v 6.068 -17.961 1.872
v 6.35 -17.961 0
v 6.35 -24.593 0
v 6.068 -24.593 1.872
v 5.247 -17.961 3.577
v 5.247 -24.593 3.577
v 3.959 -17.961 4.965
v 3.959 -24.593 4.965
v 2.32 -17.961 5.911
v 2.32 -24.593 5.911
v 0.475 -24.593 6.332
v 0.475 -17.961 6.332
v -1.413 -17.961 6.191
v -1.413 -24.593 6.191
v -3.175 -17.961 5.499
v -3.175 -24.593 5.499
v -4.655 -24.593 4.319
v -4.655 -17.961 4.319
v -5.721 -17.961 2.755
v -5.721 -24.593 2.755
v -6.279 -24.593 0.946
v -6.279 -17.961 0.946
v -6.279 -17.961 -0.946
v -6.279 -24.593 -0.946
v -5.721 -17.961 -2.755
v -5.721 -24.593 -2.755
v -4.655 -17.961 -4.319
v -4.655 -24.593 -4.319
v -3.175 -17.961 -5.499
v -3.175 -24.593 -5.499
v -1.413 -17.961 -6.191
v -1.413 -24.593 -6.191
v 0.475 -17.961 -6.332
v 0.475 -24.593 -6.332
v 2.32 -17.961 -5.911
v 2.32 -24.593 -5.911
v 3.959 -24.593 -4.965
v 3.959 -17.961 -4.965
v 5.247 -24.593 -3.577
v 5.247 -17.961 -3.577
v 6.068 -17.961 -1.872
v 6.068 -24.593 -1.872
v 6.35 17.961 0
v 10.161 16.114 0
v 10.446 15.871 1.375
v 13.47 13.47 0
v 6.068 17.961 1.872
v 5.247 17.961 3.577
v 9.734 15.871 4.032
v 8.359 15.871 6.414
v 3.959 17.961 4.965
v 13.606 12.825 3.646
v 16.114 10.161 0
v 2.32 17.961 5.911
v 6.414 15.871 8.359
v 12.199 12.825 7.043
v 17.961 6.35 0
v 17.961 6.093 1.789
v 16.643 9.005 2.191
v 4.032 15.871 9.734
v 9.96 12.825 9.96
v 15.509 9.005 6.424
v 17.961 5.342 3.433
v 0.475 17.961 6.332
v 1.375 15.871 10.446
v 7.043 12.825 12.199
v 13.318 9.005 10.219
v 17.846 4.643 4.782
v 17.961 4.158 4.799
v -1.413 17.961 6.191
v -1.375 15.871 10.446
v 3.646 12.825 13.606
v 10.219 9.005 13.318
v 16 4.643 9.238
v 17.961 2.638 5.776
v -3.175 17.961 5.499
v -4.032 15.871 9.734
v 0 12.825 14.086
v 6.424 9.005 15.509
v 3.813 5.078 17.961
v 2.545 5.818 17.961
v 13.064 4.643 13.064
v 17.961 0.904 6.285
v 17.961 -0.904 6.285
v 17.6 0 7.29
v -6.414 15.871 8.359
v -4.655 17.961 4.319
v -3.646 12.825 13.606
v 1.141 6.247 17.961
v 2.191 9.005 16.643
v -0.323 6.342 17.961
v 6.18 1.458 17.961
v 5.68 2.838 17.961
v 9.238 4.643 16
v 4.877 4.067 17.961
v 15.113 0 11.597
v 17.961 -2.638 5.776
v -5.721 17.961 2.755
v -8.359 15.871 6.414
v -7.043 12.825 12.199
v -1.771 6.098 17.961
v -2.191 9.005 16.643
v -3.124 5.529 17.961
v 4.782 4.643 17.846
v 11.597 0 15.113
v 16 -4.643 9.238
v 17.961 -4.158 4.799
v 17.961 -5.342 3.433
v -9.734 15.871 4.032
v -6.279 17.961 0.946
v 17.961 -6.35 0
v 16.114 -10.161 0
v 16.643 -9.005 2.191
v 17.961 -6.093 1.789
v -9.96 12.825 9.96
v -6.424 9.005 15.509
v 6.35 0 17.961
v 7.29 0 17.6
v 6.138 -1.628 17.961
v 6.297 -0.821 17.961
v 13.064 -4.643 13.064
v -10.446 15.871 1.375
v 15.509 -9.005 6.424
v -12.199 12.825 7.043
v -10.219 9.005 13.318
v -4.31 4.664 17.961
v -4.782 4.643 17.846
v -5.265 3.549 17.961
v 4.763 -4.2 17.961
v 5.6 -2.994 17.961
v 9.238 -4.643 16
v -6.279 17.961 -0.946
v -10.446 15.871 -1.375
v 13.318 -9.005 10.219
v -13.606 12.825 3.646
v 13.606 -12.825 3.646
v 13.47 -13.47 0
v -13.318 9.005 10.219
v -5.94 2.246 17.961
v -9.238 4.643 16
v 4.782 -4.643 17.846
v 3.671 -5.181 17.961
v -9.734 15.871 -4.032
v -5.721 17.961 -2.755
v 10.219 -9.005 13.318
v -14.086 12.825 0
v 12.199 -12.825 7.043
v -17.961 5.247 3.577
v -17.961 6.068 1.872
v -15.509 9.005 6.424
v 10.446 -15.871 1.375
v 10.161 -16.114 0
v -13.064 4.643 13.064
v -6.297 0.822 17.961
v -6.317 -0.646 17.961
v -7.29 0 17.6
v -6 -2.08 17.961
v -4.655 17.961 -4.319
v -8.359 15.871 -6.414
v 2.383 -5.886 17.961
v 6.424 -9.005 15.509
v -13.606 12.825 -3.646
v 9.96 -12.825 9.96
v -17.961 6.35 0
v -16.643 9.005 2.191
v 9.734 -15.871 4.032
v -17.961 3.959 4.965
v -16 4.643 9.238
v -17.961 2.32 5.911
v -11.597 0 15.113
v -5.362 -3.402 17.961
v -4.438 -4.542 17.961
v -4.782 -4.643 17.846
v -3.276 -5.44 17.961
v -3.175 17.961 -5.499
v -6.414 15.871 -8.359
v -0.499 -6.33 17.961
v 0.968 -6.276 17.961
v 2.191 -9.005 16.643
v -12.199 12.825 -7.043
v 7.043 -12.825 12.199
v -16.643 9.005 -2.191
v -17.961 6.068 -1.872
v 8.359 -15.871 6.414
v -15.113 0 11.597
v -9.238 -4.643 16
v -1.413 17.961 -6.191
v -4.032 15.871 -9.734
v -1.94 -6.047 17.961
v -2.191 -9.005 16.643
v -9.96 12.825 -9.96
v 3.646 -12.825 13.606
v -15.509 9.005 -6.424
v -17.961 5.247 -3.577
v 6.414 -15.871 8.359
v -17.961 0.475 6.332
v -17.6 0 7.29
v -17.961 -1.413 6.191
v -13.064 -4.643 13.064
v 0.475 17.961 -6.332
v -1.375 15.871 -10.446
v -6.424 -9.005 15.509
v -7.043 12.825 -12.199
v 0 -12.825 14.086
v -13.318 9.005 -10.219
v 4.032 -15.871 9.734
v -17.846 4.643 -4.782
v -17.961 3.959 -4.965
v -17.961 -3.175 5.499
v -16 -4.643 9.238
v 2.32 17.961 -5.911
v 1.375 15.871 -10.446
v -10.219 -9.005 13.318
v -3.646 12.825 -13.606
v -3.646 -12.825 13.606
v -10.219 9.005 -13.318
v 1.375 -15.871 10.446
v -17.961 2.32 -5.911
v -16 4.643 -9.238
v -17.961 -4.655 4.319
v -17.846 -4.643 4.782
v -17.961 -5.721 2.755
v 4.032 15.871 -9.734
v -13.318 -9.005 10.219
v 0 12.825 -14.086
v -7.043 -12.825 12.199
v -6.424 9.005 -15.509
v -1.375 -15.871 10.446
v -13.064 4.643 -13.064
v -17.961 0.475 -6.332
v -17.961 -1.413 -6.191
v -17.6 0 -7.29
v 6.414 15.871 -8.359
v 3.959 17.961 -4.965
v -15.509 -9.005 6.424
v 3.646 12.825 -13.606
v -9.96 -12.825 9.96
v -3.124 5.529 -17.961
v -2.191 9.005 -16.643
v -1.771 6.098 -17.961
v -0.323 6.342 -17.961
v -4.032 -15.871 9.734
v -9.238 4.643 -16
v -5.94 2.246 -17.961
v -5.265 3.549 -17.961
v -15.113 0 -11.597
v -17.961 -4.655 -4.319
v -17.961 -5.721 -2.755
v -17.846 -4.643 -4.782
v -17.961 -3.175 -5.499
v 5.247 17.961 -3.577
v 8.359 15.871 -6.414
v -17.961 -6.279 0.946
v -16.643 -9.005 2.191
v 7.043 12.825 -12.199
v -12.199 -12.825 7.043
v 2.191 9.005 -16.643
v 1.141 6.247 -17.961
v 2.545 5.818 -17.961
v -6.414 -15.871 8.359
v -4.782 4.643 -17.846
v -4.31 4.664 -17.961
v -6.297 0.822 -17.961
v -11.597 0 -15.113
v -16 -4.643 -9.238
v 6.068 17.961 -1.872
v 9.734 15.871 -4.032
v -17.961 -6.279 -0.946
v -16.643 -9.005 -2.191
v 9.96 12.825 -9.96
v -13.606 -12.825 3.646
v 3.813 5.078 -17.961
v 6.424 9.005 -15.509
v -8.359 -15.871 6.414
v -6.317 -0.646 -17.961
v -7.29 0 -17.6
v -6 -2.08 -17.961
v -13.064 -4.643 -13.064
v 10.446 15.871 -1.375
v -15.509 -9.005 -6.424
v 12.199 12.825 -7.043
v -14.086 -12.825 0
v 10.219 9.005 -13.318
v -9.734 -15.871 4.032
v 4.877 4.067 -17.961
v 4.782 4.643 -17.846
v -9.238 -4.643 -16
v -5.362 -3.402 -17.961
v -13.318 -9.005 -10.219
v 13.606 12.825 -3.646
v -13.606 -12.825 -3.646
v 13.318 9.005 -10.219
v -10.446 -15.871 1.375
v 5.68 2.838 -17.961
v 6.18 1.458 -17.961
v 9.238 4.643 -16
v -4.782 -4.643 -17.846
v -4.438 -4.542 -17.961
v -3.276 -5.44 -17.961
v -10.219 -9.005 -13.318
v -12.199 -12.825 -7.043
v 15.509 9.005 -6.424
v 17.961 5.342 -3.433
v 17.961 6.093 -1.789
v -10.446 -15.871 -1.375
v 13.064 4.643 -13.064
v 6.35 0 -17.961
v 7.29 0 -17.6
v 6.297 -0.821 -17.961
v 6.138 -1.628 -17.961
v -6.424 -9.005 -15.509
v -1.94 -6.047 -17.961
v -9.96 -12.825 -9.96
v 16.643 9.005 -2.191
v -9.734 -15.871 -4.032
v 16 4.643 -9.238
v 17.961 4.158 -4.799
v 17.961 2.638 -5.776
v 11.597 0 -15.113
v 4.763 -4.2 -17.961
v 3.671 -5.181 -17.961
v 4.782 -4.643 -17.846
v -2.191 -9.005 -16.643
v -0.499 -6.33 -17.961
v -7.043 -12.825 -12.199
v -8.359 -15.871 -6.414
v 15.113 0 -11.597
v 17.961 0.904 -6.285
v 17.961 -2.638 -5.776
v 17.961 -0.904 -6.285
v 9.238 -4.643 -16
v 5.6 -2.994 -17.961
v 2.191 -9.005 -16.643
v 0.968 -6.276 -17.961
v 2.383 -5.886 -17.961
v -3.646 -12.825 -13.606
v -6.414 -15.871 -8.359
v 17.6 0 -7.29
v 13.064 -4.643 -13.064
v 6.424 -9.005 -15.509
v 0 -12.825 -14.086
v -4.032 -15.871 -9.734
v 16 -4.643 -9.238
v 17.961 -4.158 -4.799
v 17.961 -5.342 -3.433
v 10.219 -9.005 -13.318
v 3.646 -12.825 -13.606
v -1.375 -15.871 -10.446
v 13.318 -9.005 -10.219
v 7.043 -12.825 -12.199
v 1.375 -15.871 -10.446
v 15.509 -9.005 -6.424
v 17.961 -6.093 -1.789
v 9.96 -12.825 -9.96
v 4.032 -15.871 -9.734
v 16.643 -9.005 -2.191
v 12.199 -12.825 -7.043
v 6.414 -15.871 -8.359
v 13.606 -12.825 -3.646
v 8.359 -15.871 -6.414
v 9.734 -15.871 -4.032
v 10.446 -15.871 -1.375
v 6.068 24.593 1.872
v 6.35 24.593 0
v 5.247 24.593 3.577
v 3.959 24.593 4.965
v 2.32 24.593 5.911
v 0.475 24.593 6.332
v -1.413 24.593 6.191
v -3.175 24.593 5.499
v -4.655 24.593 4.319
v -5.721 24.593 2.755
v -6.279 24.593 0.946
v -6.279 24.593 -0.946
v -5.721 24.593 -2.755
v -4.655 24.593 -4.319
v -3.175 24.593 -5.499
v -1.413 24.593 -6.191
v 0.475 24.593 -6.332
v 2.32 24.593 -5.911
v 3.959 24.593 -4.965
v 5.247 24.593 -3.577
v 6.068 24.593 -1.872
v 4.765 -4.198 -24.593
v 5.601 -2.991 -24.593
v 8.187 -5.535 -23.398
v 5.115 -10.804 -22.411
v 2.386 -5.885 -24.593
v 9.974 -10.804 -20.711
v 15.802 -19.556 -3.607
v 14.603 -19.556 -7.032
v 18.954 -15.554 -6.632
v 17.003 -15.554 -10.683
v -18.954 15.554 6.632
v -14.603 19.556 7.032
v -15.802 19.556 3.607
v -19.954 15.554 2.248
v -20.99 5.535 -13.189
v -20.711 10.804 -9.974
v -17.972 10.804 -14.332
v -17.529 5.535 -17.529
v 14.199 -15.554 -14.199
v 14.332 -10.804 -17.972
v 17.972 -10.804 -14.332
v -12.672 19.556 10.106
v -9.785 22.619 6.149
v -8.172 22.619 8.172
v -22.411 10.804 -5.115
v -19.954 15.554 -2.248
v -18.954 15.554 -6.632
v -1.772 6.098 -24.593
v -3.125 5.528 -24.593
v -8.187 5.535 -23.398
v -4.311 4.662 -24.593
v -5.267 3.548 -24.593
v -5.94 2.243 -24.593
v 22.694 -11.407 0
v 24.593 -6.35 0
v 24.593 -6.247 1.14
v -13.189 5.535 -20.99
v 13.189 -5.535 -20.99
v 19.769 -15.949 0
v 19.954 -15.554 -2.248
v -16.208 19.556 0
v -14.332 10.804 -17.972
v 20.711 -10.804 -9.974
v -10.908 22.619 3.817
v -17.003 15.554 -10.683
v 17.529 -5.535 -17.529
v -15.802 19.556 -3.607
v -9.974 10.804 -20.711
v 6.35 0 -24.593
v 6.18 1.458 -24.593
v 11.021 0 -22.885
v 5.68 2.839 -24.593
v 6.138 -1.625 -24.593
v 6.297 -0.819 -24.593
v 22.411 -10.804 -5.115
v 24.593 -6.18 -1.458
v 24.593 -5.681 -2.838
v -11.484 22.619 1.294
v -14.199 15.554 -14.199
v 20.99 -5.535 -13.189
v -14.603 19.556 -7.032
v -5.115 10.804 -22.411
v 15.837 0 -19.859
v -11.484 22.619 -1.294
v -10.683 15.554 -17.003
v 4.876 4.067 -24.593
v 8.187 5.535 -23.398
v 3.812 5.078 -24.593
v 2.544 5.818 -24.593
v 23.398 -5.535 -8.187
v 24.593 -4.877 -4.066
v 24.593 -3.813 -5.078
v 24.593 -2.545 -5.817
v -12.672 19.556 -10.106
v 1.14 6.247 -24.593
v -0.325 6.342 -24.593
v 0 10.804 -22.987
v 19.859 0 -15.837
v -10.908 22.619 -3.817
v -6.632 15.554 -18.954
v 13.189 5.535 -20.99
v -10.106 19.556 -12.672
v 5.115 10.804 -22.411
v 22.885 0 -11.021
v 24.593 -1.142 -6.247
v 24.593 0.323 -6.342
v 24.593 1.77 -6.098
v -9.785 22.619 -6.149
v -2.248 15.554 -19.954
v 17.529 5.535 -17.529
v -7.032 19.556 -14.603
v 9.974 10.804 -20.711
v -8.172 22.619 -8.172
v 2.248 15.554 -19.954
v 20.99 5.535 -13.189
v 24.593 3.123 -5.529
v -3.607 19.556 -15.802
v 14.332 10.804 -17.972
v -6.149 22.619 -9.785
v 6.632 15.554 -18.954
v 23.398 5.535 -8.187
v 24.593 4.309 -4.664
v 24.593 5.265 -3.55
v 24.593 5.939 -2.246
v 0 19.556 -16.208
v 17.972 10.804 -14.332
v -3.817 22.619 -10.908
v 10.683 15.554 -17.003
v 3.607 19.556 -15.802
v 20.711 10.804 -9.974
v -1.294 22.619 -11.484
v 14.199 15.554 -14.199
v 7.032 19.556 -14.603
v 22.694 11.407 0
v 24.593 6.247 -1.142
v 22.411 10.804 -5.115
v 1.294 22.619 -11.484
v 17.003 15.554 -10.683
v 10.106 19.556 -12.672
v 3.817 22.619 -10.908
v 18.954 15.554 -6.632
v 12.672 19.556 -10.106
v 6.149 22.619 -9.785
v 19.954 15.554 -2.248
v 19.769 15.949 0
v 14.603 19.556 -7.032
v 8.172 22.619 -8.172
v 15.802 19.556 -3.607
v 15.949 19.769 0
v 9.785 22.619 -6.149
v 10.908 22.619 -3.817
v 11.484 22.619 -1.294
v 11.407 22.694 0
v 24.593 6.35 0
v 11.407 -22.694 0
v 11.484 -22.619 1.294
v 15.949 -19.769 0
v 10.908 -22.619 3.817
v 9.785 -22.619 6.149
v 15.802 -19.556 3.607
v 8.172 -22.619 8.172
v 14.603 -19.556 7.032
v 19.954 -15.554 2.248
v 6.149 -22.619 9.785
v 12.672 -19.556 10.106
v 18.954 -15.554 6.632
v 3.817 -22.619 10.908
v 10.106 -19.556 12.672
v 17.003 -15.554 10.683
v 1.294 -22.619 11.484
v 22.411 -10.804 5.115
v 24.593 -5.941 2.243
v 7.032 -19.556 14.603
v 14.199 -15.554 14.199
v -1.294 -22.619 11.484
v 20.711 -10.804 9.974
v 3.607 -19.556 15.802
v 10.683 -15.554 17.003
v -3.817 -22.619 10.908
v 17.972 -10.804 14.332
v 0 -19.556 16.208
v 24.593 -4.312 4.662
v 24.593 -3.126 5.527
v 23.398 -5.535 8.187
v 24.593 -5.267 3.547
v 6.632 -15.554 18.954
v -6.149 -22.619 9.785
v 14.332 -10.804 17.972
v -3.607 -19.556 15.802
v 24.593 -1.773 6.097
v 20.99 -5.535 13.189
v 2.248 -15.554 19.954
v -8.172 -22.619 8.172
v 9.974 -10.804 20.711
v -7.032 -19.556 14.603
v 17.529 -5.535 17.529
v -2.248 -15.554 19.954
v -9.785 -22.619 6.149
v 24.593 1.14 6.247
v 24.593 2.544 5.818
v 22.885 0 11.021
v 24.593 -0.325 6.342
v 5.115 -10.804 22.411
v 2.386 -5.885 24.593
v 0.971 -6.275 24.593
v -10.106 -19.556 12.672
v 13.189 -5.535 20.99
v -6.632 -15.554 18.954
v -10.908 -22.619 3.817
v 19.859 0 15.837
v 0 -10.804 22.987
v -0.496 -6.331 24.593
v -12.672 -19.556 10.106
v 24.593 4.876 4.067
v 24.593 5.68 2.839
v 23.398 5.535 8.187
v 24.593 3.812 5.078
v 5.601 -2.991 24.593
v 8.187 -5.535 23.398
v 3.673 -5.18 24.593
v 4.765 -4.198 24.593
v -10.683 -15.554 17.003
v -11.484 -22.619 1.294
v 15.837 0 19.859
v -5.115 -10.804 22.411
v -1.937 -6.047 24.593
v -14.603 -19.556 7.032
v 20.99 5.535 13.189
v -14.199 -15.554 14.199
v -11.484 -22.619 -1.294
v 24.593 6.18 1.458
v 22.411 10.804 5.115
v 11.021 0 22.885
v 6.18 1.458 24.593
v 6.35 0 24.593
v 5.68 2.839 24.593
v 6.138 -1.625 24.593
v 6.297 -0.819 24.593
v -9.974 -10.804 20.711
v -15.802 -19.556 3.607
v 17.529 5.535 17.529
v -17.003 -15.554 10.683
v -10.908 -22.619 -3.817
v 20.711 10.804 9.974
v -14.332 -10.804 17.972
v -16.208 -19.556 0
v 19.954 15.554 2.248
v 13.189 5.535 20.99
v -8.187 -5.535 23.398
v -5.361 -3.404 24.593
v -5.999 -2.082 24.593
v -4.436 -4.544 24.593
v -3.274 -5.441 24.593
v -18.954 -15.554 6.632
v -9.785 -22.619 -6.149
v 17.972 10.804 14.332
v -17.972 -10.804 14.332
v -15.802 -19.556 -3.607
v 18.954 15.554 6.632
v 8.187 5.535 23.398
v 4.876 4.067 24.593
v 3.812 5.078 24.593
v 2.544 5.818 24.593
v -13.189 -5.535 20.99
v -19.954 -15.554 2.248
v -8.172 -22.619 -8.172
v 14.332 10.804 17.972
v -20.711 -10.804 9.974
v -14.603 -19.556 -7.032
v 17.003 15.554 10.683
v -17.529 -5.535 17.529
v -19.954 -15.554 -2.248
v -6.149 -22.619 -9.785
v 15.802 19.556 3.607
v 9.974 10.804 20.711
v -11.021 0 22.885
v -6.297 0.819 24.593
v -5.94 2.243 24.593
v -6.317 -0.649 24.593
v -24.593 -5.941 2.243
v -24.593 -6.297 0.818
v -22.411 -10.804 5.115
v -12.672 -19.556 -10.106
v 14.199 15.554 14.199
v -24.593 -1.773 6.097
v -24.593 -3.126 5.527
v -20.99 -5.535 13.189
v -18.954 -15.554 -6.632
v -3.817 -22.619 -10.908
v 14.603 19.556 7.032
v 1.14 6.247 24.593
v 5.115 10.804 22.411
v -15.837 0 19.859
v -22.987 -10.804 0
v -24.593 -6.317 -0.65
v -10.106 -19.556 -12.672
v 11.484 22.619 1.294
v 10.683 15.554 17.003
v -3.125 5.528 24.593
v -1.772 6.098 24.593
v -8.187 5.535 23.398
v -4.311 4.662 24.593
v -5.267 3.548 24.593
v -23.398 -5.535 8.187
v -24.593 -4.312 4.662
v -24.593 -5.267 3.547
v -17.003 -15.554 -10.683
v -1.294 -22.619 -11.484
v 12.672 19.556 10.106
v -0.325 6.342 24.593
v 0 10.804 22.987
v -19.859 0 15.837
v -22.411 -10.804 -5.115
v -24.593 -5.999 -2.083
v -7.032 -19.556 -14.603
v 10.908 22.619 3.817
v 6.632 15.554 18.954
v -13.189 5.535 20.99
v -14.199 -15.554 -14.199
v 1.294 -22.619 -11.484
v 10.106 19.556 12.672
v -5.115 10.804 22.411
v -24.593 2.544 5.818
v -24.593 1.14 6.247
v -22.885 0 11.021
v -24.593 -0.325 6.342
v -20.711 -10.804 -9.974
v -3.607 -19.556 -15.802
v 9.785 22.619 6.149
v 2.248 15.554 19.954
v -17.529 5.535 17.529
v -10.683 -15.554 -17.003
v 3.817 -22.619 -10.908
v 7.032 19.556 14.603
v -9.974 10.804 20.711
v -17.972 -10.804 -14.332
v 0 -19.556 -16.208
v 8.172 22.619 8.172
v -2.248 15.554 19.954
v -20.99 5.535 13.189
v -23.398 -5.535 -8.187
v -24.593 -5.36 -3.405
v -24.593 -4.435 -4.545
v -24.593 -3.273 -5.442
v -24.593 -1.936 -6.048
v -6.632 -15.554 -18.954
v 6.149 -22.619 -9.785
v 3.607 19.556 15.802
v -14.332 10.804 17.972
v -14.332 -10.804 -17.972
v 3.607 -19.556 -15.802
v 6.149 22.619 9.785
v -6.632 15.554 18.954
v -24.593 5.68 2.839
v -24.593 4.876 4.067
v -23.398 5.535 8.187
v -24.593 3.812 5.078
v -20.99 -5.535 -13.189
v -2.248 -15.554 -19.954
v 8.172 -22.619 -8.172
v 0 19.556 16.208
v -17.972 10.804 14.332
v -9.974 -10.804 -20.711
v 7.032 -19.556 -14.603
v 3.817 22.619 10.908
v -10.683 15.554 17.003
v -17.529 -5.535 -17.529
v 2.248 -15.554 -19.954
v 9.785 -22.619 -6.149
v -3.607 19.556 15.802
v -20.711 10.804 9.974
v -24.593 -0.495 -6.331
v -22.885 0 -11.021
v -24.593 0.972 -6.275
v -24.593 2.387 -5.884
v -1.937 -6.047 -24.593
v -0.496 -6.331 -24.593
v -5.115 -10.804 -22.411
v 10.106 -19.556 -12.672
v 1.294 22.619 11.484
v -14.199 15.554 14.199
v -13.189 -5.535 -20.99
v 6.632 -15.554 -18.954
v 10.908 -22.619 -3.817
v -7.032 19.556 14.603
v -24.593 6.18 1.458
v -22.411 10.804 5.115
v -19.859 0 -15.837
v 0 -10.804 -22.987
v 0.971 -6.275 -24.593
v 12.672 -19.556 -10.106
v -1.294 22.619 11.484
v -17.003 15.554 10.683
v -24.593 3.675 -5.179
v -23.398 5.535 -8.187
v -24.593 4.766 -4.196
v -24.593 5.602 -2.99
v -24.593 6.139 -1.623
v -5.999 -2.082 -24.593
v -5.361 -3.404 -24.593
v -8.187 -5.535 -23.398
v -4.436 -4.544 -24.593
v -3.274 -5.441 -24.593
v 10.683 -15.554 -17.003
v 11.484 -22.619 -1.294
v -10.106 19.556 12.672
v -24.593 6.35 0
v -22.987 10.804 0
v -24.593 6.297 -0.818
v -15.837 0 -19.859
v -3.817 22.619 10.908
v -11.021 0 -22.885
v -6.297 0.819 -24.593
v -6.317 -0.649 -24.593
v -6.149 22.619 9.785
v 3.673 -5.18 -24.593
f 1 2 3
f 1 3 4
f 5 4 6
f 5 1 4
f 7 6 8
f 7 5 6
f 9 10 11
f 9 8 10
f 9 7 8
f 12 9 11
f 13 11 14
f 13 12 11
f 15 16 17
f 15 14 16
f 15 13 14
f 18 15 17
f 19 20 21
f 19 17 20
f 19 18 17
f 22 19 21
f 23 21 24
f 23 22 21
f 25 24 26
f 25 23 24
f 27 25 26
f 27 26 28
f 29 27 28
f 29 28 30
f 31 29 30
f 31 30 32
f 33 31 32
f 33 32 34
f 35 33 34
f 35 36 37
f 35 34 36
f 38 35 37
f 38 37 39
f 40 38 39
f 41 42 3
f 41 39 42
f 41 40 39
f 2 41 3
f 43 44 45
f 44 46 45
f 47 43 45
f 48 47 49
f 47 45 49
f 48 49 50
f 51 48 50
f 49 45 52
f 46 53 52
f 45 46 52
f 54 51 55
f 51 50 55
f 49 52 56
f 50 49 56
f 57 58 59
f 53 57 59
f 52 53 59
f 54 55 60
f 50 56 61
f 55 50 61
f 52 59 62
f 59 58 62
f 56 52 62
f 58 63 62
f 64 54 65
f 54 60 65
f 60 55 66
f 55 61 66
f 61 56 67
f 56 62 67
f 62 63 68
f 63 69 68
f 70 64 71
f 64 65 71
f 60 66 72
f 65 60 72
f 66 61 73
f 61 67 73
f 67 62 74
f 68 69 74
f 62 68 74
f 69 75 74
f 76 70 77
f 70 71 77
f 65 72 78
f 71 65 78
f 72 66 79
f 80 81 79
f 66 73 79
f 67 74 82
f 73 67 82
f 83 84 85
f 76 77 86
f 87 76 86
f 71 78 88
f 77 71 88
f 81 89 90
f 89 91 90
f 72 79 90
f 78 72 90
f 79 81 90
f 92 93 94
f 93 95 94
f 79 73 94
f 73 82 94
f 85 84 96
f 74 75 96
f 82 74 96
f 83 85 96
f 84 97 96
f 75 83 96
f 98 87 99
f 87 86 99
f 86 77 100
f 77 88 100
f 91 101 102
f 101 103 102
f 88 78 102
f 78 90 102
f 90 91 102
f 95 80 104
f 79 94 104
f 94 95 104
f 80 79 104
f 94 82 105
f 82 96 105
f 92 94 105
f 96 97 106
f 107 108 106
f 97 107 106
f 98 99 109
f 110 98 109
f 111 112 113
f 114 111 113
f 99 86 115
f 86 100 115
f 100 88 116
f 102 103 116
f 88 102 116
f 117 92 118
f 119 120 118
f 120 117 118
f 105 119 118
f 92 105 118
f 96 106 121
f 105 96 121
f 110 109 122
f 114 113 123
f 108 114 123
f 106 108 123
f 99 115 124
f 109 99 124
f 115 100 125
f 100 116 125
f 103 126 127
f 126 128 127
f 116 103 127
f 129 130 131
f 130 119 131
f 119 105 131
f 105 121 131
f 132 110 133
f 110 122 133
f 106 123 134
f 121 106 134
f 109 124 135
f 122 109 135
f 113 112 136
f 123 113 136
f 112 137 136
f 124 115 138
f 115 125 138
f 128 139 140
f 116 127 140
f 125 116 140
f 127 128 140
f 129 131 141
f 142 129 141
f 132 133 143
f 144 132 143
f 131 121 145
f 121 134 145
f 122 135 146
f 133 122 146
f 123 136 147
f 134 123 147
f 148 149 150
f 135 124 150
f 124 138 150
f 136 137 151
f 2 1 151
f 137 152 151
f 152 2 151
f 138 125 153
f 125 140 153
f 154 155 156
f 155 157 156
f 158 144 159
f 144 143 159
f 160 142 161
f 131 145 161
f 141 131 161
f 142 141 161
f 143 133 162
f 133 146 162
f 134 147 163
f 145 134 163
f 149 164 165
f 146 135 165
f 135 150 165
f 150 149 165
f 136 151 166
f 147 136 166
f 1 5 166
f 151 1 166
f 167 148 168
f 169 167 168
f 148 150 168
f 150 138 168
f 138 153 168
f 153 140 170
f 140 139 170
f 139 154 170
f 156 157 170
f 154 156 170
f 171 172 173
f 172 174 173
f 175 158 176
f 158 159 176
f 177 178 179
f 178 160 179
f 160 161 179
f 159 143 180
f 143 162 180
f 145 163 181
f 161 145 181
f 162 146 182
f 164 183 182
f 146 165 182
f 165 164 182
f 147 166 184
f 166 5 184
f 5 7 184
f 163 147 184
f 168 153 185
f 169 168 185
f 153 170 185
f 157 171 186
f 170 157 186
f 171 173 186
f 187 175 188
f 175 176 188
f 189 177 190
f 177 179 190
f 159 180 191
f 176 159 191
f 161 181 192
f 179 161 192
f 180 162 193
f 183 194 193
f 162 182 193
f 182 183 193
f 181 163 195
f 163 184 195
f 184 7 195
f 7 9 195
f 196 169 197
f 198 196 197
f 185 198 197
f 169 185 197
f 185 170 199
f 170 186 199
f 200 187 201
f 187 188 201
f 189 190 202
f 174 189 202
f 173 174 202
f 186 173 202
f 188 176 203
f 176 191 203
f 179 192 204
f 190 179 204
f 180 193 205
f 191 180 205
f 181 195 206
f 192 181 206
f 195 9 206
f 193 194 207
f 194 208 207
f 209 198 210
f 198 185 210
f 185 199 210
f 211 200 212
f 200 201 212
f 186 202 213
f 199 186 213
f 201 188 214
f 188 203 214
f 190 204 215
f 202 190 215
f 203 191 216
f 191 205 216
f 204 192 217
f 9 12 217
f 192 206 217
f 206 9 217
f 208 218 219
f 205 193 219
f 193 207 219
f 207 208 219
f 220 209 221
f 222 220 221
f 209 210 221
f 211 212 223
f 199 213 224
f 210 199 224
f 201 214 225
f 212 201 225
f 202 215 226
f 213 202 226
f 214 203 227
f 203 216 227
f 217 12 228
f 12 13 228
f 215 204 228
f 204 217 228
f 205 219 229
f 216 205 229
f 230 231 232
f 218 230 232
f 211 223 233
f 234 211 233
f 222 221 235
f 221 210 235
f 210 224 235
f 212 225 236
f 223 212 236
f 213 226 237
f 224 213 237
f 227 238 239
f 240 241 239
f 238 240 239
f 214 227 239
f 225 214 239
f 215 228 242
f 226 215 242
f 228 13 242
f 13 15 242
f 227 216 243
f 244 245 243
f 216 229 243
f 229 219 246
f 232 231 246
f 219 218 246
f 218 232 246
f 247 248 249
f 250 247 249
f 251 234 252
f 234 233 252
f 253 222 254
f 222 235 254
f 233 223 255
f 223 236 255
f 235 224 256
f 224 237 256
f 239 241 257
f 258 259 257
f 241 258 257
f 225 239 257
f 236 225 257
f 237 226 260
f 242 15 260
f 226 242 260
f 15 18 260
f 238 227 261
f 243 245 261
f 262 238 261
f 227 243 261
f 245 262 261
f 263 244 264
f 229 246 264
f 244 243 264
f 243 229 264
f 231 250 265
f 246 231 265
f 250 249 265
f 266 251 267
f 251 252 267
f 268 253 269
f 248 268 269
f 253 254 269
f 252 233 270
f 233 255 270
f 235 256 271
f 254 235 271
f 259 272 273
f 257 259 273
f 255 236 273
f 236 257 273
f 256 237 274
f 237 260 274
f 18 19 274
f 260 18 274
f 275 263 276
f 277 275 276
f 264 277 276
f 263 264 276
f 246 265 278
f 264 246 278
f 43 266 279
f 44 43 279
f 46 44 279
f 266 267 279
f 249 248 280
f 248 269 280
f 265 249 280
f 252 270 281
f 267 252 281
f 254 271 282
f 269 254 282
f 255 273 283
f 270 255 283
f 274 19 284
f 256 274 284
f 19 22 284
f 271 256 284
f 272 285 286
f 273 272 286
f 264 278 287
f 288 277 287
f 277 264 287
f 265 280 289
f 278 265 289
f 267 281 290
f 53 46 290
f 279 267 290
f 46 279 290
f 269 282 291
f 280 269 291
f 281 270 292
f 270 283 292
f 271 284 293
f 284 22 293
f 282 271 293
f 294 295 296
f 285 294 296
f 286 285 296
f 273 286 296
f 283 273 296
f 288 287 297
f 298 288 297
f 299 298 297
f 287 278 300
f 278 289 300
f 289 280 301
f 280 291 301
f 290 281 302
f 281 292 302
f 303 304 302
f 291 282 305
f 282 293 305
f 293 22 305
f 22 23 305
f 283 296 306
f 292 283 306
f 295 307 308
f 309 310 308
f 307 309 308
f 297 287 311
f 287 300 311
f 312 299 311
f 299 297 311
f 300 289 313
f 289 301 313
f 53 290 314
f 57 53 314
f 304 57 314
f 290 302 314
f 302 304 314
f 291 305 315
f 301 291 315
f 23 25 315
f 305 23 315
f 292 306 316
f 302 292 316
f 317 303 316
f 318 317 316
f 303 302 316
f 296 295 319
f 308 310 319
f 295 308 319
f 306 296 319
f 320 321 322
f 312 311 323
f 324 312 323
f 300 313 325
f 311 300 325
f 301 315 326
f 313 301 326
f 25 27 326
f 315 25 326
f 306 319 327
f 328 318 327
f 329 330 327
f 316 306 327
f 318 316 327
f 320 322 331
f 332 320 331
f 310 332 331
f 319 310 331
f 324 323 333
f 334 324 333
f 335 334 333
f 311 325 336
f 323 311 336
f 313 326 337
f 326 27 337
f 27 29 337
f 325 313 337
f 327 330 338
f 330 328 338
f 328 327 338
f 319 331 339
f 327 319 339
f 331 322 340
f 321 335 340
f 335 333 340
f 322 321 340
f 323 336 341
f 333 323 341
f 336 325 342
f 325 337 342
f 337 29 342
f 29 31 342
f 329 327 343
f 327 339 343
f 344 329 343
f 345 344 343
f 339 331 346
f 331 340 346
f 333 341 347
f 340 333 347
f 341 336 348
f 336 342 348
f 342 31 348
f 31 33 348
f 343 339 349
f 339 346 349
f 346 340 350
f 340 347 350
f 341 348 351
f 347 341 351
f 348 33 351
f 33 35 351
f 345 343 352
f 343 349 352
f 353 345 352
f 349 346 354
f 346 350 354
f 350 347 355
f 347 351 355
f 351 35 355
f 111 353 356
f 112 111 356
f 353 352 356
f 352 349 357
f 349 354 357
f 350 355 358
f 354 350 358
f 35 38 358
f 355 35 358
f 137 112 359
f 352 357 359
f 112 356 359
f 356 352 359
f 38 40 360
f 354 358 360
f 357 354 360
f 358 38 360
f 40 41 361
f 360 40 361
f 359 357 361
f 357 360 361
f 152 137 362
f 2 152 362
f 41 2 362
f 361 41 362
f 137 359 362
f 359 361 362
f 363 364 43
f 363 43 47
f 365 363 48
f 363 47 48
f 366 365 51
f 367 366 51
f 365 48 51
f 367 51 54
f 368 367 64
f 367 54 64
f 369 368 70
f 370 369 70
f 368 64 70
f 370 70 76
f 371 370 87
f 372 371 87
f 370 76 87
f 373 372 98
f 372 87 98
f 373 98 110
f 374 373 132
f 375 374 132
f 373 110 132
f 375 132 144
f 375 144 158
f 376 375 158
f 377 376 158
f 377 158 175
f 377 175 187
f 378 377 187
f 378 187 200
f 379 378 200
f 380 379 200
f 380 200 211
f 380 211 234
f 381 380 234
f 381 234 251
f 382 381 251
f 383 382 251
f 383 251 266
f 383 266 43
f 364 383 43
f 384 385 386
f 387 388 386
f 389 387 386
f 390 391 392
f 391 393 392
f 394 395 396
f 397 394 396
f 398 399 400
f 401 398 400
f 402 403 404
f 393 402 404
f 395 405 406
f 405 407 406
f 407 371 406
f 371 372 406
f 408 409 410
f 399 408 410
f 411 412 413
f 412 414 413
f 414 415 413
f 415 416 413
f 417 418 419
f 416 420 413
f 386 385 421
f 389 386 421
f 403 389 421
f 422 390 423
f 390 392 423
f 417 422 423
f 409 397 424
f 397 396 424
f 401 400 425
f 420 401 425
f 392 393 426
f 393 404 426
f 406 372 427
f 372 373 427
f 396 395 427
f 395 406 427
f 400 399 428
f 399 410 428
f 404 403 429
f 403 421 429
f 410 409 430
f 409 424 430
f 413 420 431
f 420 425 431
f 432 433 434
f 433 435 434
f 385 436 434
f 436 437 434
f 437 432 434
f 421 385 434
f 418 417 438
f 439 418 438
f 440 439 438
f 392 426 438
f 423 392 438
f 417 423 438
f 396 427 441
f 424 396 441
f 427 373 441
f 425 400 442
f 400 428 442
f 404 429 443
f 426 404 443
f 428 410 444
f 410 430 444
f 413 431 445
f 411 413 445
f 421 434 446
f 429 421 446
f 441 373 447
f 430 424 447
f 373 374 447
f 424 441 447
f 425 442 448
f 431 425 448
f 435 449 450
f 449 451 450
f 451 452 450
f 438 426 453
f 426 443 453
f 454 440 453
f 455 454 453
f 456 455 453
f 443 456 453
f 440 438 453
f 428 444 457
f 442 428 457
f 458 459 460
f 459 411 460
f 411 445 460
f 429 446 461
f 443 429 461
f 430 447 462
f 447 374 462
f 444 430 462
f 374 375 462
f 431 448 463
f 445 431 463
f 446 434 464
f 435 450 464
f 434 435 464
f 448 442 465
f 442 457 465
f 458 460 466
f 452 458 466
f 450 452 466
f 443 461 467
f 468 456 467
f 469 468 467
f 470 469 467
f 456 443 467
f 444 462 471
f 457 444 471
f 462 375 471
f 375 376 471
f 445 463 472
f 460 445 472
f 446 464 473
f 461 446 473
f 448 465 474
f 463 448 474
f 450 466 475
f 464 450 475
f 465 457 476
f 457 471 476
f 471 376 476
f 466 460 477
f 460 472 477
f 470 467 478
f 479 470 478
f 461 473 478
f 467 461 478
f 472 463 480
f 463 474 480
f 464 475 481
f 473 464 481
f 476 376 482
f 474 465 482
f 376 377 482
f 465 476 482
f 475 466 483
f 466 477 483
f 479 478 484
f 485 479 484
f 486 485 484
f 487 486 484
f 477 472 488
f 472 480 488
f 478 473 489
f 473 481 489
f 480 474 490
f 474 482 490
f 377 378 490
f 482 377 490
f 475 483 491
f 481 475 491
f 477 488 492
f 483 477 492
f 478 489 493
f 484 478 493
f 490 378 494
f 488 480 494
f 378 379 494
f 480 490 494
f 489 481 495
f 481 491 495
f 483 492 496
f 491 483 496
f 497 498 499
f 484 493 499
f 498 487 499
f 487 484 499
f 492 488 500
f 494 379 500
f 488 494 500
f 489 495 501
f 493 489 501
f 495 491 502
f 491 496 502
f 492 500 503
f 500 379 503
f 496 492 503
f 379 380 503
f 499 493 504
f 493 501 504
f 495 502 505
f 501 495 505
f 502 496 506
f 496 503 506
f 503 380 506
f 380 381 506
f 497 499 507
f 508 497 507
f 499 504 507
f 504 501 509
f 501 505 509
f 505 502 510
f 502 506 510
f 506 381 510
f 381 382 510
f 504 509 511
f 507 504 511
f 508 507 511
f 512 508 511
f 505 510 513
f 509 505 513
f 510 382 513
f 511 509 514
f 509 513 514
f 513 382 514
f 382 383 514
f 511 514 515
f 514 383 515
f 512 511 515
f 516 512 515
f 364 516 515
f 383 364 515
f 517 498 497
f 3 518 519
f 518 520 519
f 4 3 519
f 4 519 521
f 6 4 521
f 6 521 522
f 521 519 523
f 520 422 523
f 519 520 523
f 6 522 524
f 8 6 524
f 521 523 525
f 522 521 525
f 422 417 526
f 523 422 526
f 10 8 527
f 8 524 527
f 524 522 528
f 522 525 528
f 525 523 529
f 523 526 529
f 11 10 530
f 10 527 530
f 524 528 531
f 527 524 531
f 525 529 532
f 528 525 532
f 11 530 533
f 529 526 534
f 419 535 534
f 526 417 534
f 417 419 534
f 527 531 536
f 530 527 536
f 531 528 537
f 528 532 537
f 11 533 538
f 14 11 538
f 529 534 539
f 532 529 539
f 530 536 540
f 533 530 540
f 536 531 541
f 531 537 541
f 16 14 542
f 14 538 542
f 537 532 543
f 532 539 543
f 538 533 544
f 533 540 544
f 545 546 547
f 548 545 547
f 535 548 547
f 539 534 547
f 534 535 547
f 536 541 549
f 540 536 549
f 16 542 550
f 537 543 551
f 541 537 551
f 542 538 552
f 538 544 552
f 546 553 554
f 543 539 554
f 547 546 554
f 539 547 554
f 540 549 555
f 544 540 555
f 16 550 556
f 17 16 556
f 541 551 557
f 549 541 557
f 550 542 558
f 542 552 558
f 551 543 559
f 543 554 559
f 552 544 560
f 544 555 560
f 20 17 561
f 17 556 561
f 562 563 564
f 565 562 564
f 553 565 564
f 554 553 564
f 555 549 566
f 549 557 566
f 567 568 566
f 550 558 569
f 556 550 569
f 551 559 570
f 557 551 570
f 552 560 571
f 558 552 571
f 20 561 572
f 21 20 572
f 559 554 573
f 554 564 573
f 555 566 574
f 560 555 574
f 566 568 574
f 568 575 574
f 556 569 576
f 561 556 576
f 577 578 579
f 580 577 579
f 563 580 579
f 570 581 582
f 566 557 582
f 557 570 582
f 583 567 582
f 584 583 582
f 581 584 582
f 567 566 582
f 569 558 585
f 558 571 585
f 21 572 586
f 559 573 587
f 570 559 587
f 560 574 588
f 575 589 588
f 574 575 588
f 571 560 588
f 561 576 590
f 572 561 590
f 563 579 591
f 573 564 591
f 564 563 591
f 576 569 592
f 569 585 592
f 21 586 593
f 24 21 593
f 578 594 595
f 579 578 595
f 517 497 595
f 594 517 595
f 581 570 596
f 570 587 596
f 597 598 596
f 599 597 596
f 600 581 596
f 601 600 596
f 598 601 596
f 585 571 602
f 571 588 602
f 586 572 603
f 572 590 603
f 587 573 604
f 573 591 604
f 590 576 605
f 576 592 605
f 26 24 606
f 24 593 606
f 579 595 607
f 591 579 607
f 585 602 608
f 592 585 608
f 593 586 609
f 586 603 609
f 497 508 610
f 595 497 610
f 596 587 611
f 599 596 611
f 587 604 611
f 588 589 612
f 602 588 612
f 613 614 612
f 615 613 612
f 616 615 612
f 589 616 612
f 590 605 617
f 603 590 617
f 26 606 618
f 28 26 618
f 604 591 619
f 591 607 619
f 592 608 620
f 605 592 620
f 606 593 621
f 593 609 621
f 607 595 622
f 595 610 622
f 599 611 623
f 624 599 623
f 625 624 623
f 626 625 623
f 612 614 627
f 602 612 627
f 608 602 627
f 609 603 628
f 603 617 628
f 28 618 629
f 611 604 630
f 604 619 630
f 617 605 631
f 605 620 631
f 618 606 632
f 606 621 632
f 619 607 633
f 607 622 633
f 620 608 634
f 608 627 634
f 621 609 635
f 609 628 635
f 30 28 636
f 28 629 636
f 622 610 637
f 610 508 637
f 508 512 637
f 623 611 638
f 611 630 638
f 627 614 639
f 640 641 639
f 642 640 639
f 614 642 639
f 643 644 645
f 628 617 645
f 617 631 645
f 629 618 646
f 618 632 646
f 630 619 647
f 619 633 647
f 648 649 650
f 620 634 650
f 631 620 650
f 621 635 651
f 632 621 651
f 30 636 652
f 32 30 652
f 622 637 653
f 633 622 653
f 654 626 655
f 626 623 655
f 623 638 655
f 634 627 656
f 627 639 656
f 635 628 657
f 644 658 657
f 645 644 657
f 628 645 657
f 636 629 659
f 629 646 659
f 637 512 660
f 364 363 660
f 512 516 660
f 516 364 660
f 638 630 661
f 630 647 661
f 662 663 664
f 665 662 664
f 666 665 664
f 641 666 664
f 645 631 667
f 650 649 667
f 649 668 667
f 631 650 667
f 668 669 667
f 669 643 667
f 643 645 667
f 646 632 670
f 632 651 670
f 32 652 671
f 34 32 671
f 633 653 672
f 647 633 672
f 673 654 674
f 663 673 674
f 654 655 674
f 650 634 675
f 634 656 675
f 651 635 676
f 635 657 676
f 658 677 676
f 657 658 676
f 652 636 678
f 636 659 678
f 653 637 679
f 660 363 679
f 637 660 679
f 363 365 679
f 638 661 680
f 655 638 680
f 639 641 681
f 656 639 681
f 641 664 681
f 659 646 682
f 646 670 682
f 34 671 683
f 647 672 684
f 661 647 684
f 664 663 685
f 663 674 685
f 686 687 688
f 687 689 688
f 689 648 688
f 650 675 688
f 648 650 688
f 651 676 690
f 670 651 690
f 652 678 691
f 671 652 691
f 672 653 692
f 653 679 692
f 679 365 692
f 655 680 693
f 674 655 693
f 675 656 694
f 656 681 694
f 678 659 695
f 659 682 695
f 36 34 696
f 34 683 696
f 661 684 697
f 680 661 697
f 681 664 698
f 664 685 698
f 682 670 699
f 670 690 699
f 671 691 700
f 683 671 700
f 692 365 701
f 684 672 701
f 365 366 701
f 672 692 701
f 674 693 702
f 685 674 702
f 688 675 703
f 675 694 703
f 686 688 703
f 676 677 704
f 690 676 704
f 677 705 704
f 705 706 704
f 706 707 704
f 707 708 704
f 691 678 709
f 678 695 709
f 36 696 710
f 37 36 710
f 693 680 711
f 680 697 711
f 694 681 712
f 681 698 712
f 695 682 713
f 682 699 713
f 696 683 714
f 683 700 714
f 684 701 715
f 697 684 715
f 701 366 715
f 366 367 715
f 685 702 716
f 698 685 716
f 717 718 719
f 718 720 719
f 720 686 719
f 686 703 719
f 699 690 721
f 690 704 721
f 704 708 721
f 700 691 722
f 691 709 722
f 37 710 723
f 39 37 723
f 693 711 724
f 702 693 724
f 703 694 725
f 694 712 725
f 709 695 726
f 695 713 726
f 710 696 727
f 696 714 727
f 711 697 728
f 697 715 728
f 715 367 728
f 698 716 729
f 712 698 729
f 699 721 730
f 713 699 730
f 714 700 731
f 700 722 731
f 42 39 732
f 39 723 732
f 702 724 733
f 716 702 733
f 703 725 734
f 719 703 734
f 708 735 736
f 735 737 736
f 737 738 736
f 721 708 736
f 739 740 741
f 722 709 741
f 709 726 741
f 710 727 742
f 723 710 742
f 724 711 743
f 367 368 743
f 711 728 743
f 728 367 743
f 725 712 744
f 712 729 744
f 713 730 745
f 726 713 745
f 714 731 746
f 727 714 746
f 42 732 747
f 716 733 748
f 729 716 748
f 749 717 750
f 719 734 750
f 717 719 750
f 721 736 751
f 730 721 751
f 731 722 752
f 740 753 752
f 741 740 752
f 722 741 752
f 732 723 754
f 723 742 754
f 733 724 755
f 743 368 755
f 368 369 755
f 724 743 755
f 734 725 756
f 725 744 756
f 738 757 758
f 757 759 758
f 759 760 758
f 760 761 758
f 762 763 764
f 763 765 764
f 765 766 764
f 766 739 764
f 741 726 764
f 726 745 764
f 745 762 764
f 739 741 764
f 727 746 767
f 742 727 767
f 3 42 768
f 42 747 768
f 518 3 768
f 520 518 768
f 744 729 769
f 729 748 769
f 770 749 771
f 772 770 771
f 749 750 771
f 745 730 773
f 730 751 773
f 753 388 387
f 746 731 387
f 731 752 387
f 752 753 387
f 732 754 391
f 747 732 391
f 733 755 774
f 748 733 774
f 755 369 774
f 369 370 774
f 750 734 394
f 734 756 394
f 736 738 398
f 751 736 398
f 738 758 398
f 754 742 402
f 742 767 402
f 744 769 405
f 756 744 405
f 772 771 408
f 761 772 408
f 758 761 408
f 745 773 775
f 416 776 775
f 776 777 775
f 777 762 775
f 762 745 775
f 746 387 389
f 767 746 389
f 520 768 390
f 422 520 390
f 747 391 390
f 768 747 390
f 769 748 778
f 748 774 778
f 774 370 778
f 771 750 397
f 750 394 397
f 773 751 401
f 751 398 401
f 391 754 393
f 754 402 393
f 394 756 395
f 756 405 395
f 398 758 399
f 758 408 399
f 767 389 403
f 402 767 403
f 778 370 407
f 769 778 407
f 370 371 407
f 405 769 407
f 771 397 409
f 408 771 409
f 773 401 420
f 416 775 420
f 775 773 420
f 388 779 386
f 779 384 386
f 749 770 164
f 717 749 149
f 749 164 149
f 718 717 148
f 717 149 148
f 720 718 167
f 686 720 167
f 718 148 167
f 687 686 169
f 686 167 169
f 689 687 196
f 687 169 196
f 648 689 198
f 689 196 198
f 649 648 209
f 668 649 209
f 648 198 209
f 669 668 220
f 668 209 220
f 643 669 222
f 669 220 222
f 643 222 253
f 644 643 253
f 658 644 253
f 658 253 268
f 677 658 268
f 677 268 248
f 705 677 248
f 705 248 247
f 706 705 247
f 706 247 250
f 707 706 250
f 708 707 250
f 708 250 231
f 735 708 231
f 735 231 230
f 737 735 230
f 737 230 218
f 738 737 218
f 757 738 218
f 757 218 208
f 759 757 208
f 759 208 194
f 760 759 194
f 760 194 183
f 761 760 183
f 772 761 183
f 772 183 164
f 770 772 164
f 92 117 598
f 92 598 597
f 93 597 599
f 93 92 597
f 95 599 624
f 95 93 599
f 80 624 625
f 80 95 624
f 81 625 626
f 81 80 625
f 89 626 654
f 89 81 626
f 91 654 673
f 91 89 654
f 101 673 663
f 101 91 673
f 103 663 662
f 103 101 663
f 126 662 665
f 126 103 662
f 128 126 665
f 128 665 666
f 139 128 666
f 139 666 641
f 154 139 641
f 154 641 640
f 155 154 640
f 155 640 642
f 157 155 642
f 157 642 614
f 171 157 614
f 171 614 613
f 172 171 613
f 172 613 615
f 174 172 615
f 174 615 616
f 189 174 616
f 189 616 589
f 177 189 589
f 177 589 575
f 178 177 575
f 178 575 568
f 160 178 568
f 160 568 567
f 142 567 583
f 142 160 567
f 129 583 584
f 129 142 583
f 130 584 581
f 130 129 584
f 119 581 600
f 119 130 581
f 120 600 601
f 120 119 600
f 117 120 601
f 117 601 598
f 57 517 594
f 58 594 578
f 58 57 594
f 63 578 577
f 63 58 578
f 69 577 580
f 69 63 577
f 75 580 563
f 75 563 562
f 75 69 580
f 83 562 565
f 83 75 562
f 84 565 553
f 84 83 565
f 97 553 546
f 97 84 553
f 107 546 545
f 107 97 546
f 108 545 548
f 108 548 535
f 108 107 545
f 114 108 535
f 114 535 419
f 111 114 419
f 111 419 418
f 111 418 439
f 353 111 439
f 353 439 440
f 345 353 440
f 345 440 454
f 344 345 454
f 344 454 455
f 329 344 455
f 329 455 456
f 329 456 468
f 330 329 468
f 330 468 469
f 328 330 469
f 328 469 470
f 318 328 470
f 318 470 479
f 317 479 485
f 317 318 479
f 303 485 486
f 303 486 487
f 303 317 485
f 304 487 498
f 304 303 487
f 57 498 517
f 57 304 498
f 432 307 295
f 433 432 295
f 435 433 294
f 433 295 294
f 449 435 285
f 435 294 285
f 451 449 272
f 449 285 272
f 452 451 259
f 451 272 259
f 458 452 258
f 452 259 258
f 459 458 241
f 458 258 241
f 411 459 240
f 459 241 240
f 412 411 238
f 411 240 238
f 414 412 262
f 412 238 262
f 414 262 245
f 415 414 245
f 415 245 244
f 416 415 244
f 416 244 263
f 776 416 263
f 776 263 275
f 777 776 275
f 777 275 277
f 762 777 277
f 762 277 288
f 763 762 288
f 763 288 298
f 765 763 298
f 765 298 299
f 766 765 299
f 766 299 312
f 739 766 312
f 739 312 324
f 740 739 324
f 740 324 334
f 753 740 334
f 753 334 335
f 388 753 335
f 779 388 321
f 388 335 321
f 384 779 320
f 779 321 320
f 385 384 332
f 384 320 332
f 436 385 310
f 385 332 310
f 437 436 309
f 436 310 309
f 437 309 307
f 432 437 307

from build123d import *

# Parameters (mm, degrees)
F2_R      = 6.35
F3_DEPTH  = 59.182
F4_R      = 6.35
F5_DEPTH  = 25.4
F6_R      = 6.35
F7_DEPTH  = 25.4
F8_R      = 6.35
F9_DEPTH  = 39.116
F10_R     = 6.35
F11_DEPTH = 44.45
F12_R     = 6.35
F13_DEPTH = 41.148


with BuildPart() as f1:
    # F0 (on Top) → F1 (revolve)
    with BuildSketch(Plane.XY):
        with BuildLine():
            Line((0, -19.05), (0, -25.4))
            ThreePointArc((0, -25.4), (25.4, 0), (0, 25.4))
            Line((0, 25.4), (0, 19.05))
            ThreePointArc((0, 19.05), (19.05, 0), (0, -19.05))
        make_face()
    revolve(axis=Axis((0, 22.225, 0), (0, -1, 0)))

    # F2 (on Top) → F3 (cut)
    with BuildSketch(Plane.XY):
        Circle(F2_R)
    extrude(amount=-F3_DEPTH, mode=Mode.SUBTRACT)

    # F4 (on Right) → F5 (cut)
    with BuildSketch(Plane.YZ):
        Circle(F4_R)
    extrude(amount=-F5_DEPTH, mode=Mode.SUBTRACT)

    # F6 (on Front) → F7 (cut)
    with BuildSketch(Plane.XZ):
        Circle(F6_R)
    extrude(amount=-F7_DEPTH, mode=Mode.SUBTRACT)

    # F8 (on Right) → F9 (cut)
    with BuildSketch(Plane.YZ):
        Circle(F8_R)
    extrude(amount=F9_DEPTH, mode=Mode.SUBTRACT)

    # F10 (on Front) → F11 (cut)
    with BuildSketch(Plane.XZ):
        Circle(F10_R)
    extrude(amount=F11_DEPTH, mode=Mode.SUBTRACT)

    # F12 (on Top) → F13 (cut)
    with BuildSketch(Plane.XY):
        Circle(F12_R)
    extrude(amount=F13_DEPTH, mode=Mode.SUBTRACT)


solid = f1.part
